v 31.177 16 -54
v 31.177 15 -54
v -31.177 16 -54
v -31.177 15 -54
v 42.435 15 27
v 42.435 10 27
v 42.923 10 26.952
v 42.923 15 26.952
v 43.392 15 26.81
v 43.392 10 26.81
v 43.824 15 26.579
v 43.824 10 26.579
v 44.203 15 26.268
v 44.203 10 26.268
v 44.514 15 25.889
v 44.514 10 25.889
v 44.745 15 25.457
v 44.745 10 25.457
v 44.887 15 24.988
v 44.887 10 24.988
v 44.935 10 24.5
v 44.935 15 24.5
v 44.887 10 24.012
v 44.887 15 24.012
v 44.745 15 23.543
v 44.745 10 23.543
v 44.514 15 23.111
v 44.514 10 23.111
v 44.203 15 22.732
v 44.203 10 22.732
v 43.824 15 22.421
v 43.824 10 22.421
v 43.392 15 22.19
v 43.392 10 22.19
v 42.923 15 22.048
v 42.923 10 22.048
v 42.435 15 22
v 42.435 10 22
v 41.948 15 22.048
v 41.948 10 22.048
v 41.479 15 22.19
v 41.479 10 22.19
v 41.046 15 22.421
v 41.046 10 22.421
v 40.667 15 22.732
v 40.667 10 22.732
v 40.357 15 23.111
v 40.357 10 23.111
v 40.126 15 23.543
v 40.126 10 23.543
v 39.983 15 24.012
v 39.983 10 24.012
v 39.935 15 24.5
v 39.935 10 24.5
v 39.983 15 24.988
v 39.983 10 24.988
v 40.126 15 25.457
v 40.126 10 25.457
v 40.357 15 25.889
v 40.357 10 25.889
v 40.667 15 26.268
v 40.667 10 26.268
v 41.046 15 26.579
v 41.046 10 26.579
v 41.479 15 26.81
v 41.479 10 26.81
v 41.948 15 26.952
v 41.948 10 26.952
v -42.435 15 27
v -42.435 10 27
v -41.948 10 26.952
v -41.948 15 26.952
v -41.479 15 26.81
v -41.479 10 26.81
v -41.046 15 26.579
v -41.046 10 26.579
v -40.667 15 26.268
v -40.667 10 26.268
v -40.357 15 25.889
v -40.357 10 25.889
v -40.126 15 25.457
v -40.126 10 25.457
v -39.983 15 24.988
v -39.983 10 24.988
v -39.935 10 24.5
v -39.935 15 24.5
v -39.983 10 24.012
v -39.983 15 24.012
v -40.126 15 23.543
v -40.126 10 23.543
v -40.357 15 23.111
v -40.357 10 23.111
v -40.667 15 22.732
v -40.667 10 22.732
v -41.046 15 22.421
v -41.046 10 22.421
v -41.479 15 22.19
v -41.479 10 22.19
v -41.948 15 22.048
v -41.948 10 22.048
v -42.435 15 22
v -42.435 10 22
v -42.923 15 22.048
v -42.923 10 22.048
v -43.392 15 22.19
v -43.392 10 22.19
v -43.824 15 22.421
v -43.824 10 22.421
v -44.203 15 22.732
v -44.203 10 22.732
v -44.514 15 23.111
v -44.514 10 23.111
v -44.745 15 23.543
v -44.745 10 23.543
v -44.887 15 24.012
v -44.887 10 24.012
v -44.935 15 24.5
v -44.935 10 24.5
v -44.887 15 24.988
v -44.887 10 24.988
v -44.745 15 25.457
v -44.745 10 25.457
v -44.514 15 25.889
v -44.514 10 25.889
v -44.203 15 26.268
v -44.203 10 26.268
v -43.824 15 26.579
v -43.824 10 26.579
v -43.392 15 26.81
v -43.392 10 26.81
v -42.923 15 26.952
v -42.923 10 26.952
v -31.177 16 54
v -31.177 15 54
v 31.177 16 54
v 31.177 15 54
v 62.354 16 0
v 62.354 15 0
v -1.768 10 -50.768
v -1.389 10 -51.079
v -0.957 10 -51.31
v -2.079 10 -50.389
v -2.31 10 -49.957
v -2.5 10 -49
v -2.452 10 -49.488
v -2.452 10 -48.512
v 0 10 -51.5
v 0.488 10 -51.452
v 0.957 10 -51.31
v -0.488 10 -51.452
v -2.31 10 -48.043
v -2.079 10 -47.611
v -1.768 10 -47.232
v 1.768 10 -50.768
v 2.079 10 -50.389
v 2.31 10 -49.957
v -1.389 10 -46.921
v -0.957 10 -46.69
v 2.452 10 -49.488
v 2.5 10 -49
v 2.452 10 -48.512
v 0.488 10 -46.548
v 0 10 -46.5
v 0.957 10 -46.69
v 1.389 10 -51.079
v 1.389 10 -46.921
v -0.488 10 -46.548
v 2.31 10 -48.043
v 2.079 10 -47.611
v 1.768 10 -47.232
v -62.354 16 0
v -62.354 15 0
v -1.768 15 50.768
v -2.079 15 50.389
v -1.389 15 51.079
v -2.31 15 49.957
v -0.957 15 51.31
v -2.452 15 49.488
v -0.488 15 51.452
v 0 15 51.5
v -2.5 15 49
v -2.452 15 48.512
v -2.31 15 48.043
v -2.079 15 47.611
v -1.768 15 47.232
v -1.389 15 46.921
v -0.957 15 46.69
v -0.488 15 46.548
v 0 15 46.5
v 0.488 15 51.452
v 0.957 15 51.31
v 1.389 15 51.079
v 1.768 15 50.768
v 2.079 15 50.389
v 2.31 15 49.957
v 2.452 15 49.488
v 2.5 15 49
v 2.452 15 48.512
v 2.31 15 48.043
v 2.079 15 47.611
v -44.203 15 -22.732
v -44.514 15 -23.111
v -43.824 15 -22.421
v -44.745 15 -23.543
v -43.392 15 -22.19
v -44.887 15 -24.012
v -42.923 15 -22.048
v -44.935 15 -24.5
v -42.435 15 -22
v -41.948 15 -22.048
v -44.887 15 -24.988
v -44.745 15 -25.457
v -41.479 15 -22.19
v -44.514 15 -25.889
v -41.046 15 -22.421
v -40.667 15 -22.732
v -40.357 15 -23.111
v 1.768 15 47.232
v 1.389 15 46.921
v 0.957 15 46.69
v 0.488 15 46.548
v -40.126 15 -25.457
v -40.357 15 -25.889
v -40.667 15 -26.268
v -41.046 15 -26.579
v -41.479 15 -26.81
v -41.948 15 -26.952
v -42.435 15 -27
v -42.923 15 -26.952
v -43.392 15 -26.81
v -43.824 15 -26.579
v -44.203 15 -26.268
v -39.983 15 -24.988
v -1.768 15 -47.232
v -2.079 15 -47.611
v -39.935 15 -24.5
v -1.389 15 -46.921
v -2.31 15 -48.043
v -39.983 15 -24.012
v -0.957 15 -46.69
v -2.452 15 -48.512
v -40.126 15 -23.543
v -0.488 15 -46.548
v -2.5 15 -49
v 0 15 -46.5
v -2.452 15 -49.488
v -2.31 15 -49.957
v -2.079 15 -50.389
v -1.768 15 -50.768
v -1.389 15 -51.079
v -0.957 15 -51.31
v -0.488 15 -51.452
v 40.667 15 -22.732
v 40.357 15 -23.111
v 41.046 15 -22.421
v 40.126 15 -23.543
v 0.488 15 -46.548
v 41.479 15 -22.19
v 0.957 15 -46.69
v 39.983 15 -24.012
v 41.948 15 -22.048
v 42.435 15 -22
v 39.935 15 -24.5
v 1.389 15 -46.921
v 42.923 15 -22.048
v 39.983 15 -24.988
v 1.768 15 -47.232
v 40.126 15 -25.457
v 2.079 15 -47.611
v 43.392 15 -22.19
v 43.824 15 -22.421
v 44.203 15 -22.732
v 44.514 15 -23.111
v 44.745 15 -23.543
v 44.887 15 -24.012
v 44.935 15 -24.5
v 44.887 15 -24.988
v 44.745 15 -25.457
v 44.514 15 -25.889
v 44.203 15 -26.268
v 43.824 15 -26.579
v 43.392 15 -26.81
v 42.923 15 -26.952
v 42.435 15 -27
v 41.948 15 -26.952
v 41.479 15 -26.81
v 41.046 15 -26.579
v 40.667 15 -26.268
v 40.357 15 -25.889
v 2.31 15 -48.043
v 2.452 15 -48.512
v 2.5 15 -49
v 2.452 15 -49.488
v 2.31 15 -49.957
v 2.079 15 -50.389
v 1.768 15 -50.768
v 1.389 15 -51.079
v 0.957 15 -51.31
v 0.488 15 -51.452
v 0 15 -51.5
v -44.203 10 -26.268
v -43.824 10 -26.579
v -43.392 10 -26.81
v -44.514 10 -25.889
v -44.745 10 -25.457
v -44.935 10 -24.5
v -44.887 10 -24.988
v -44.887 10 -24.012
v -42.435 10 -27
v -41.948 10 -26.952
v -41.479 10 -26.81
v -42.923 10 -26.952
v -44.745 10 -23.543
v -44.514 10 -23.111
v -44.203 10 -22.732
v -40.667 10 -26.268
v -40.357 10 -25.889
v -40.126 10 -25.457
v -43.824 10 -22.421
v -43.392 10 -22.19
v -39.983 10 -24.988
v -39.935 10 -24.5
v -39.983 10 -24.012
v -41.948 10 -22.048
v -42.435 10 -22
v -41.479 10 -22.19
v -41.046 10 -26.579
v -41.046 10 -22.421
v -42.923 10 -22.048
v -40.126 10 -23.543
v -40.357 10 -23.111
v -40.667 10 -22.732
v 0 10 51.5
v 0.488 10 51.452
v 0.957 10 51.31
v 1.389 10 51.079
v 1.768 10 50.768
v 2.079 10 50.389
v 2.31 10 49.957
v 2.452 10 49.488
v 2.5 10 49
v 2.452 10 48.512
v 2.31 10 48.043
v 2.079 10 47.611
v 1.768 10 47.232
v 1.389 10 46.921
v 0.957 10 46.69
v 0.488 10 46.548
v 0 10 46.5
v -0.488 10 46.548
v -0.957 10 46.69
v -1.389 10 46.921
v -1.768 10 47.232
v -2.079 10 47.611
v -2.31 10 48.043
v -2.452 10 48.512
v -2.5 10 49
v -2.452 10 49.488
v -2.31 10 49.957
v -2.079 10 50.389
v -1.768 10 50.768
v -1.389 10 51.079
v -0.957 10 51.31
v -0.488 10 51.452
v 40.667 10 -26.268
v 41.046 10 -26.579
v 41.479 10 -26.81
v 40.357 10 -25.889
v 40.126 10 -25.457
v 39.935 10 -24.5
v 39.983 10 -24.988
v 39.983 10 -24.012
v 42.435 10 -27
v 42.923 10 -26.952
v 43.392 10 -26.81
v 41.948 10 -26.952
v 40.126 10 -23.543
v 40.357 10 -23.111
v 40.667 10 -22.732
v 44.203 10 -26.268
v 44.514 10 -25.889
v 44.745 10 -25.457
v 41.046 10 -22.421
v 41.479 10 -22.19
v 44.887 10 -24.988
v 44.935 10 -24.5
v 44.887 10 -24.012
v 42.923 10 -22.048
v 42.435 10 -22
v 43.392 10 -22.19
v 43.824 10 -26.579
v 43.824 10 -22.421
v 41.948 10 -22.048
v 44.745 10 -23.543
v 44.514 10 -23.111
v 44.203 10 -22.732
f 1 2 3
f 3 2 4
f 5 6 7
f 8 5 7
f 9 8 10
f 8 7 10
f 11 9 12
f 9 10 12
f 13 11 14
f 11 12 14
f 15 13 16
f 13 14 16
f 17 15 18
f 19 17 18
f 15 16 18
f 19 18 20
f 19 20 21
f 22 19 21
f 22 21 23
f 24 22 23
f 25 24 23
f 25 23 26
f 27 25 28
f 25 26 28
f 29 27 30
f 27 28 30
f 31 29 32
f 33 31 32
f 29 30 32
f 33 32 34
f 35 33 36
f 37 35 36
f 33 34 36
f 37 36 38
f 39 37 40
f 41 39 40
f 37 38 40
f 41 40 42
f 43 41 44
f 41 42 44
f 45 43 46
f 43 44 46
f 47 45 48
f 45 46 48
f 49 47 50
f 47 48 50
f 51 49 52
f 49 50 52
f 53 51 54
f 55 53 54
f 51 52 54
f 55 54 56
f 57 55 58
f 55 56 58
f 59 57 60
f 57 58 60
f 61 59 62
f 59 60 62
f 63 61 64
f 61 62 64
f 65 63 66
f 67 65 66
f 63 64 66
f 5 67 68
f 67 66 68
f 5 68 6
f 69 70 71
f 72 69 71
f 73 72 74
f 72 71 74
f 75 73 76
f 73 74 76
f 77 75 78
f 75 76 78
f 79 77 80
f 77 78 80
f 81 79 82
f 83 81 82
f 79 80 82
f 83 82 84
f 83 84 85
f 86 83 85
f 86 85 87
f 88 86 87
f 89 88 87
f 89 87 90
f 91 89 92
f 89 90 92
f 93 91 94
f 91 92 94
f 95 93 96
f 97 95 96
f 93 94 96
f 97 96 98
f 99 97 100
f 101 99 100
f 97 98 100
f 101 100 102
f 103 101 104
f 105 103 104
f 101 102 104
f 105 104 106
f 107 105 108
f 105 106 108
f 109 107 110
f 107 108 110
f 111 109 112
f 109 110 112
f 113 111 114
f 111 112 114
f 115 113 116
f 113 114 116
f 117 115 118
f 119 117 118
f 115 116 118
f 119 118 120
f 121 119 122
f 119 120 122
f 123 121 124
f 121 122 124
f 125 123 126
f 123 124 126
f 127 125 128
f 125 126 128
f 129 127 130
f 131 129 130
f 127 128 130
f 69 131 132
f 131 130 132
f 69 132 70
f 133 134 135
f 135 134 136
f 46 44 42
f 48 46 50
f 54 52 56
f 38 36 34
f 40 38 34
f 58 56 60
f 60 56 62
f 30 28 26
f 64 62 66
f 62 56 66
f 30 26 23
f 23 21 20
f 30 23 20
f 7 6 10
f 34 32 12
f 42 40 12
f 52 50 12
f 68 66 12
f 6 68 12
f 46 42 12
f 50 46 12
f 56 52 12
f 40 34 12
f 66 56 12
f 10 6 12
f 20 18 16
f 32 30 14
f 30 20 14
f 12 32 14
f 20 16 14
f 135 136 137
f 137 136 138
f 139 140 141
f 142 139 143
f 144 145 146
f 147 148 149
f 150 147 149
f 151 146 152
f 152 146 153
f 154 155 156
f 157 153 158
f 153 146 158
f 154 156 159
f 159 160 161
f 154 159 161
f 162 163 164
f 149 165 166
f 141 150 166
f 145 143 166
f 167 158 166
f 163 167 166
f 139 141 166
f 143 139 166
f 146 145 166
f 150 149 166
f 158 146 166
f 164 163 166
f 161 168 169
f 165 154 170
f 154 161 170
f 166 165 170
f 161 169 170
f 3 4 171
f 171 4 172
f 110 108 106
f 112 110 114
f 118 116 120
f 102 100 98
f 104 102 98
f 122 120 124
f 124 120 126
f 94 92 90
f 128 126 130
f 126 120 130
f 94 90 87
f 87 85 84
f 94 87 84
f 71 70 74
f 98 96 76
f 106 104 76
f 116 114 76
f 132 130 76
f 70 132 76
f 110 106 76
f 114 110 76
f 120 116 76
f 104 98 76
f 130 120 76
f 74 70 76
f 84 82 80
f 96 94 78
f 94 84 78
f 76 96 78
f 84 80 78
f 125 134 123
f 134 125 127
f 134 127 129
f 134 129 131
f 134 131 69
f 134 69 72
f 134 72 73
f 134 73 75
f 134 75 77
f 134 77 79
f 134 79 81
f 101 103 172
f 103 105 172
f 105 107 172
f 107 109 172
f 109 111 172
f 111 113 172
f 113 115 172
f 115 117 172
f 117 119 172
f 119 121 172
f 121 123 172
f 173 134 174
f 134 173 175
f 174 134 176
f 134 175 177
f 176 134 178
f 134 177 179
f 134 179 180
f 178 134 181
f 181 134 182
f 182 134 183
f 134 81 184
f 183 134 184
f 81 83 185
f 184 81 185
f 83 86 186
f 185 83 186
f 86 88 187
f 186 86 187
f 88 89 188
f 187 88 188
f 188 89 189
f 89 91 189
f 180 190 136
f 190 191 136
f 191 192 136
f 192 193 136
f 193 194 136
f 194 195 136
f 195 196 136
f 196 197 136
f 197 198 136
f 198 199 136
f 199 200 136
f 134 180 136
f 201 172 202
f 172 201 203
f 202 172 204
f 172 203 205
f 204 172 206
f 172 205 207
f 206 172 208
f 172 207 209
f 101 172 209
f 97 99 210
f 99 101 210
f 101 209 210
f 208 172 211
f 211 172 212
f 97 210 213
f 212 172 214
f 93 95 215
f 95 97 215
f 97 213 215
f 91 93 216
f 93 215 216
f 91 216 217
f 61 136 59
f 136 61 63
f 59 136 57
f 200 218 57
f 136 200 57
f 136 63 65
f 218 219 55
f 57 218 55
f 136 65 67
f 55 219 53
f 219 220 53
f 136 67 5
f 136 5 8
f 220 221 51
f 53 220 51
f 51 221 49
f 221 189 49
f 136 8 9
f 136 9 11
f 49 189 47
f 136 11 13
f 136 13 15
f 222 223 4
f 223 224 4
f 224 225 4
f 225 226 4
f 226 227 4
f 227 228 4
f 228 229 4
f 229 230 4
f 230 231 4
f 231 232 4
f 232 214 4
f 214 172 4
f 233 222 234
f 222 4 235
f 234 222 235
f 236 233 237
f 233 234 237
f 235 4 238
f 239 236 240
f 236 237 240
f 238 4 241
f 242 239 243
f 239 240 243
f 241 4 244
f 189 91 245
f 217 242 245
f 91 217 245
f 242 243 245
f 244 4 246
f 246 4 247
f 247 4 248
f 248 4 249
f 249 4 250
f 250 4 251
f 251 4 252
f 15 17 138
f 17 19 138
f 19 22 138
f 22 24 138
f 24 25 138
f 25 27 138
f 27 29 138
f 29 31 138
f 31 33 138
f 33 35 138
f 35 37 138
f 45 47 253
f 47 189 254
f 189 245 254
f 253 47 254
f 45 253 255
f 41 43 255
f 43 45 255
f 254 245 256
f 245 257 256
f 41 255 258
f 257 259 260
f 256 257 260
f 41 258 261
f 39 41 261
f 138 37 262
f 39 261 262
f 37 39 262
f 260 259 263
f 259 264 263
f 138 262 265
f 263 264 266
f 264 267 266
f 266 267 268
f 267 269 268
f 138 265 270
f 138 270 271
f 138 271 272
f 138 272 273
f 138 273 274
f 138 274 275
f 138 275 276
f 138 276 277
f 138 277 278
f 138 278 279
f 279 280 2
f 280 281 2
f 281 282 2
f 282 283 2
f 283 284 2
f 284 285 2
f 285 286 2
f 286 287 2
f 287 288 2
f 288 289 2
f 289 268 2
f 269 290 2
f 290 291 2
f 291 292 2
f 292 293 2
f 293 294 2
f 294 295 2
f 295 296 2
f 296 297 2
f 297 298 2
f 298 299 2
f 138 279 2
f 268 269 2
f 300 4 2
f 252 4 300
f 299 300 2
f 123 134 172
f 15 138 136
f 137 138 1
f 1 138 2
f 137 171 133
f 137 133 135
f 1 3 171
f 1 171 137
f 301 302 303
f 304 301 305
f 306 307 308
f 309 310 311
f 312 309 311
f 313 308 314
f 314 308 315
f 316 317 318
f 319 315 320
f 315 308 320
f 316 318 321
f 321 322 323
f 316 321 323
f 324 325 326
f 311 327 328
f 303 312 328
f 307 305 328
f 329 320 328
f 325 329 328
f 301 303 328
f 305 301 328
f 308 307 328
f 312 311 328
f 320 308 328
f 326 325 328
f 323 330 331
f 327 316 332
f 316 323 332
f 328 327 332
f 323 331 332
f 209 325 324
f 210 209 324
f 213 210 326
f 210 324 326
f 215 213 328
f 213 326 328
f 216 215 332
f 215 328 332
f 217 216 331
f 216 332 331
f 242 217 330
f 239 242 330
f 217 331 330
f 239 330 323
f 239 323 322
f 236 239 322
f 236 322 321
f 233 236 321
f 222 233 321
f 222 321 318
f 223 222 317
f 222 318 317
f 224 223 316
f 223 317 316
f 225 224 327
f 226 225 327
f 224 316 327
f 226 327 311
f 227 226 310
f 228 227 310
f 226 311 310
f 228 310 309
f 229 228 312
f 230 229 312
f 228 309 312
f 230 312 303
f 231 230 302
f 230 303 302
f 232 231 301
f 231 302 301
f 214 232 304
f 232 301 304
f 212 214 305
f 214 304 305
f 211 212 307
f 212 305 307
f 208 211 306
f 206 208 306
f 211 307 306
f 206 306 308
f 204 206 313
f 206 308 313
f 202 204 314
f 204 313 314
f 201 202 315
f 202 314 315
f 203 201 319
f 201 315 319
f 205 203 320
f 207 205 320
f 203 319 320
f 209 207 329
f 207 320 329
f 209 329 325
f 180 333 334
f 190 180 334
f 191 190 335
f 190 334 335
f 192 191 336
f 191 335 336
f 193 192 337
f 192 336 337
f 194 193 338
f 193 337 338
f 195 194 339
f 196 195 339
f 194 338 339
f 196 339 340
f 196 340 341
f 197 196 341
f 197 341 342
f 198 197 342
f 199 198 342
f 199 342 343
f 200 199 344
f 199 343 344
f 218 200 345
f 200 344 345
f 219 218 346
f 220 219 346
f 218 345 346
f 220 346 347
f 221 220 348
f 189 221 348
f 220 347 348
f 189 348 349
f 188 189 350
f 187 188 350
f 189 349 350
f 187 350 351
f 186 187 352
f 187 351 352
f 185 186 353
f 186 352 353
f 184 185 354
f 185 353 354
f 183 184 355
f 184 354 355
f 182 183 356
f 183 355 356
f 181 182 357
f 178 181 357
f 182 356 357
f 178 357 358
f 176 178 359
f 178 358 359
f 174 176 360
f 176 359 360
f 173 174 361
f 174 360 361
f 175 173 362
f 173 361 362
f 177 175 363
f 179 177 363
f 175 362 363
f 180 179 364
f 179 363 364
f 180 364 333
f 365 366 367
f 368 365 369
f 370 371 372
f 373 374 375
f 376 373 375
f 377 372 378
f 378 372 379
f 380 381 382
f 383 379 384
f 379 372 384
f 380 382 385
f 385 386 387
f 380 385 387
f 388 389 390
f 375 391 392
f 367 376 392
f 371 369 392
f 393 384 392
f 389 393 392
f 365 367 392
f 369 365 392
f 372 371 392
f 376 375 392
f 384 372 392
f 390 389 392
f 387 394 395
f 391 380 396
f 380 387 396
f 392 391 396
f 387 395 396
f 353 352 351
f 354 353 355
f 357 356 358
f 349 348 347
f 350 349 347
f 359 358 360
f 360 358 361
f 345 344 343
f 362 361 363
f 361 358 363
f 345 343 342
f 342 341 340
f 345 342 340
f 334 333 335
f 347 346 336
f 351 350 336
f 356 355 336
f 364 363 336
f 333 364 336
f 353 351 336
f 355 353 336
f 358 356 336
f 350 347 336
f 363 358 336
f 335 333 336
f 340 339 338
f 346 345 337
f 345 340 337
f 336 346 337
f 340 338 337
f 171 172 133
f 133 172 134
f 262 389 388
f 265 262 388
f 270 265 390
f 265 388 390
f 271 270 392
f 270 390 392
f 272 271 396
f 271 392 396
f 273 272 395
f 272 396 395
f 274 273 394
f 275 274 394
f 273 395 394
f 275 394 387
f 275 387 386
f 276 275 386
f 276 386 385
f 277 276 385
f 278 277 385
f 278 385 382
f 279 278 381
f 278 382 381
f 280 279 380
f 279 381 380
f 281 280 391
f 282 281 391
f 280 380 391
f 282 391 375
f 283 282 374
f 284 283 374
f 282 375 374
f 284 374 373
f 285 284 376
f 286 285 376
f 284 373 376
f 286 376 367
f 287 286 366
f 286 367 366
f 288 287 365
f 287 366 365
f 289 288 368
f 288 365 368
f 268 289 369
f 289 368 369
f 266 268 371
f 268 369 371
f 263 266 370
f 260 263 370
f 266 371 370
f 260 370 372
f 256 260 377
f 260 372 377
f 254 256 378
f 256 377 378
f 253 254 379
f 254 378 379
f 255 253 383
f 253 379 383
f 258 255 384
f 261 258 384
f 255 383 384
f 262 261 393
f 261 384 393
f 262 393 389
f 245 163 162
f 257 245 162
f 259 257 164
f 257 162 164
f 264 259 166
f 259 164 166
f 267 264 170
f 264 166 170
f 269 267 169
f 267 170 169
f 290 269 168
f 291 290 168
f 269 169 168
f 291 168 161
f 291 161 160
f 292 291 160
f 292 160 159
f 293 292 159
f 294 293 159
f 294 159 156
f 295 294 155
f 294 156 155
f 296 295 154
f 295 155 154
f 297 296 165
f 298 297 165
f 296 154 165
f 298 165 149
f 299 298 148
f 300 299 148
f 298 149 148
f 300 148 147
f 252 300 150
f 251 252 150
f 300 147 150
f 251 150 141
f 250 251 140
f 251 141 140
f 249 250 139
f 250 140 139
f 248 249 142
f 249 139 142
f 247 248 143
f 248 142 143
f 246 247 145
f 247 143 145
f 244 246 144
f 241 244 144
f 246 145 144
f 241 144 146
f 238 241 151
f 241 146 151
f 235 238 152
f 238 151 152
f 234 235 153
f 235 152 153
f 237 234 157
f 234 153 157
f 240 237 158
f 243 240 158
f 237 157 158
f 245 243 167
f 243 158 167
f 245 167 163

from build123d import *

# Parameters (mm, degrees)
SKETCH1_R             = 2.5
BOSS_EXTRUDE1_DEPTH   = 5
BOSS_EXTRUDE1_2_DEPTH = 5
BOSS_EXTRUDE1_3_DEPTH = 5
BOSS_EXTRUDE1_4_DEPTH = 5
BOSS_EXTRUDE1_5_DEPTH = 5
BOSS_EXTRUDE1_6_DEPTH = 5
BOSS_EXTRUDE2_DEPTH   = 1


with BuildPart() as part:
    # Sketch1 → Boss-Extrude1 (new body)
    with BuildSketch(Plane(origin=(0, 10, 0), x_dir=(1, 0, 0), z_dir=(0, 1, 0))):
        with Locations(Location((0, 49, 0), (0, 0, 270))):
            Circle(SKETCH1_R)
    extrude(amount=BOSS_EXTRUDE1_DEPTH)



with BuildPart() as body_2:
    # Sketch1 → Boss-Extrude1 2 (new body)
    with BuildSketch(Plane(origin=(0, 10, 0), x_dir=(1, 0, 0), z_dir=(0, 1, 0))):
        with Locations(Location((42.435244785, 24.5, 0), (0, 0, 270))):
            Circle(SKETCH1_R)
    extrude(amount=BOSS_EXTRUDE1_2_DEPTH)


with BuildPart() as body_3:
    # Sketch1 → Boss-Extrude1 3 (new body)
    with BuildSketch(Plane(origin=(0, 10, 0), x_dir=(1, 0, 0), z_dir=(0, 1, 0))):
        with Locations(Location((42.435244785, -24.5, 0), (0, 0, 270))):
            Circle(SKETCH1_R)
    extrude(amount=BOSS_EXTRUDE1_3_DEPTH)


with BuildPart() as body_4:
    # Sketch1 → Boss-Extrude1 4 (new body)
    with BuildSketch(Plane(origin=(0, 10, 0), x_dir=(1, 0, 0), z_dir=(0, 1, 0))):
        with Locations(Location((0, -49, 0), (0, 0, 270))):
            Circle(SKETCH1_R)
    extrude(amount=BOSS_EXTRUDE1_4_DEPTH)


with BuildPart() as body_5:
    # Sketch1 → Boss-Extrude1 5 (new body)
    with BuildSketch(Plane(origin=(0, 10, 0), x_dir=(1, 0, 0), z_dir=(0, 1, 0))):
        with Locations(Location((-42.435244785, -24.5, 0), (0, 0, 270))):
            Circle(SKETCH1_R)
    extrude(amount=BOSS_EXTRUDE1_5_DEPTH)


with BuildPart() as body_6:
    # Sketch1 → Boss-Extrude1 6 (new body)
    with BuildSketch(Plane(origin=(0, 10, 0), x_dir=(1, 0, 0), z_dir=(0, 1, 0))):
        with Locations(Location((-42.435244785, 24.5, 0), (0, 0, 270))):
            Circle(SKETCH1_R)
    extrude(amount=BOSS_EXTRUDE1_6_DEPTH)


with BuildPart() as part_1:
    add(part.part)

    add(body_2.part)  # Boss-Extrude2 merges body 2

    add(body_3.part)  # Boss-Extrude2 merges body 3

    add(body_4.part)  # Boss-Extrude2 merges body 4

    add(body_5.part)  # Boss-Extrude2 merges body 5

    add(body_6.part)  # Boss-Extrude2 merges body 6
    # Sketch2 → Boss-Extrude2 (add)
    with BuildSketch(Plane(origin=(0, 15, 0), x_dir=(1, 0, 0), z_dir=(0, 1, 0))):
        Polygon((62.353829072, 0), (31.176914536, 54), (-31.176914536, 54), (-62.353829072, 0), (-31.176914536, -54), (31.176914536, -54), align=None)
    extrude(amount=BOSS_EXTRUDE2_DEPTH)


solid = part_1.part
